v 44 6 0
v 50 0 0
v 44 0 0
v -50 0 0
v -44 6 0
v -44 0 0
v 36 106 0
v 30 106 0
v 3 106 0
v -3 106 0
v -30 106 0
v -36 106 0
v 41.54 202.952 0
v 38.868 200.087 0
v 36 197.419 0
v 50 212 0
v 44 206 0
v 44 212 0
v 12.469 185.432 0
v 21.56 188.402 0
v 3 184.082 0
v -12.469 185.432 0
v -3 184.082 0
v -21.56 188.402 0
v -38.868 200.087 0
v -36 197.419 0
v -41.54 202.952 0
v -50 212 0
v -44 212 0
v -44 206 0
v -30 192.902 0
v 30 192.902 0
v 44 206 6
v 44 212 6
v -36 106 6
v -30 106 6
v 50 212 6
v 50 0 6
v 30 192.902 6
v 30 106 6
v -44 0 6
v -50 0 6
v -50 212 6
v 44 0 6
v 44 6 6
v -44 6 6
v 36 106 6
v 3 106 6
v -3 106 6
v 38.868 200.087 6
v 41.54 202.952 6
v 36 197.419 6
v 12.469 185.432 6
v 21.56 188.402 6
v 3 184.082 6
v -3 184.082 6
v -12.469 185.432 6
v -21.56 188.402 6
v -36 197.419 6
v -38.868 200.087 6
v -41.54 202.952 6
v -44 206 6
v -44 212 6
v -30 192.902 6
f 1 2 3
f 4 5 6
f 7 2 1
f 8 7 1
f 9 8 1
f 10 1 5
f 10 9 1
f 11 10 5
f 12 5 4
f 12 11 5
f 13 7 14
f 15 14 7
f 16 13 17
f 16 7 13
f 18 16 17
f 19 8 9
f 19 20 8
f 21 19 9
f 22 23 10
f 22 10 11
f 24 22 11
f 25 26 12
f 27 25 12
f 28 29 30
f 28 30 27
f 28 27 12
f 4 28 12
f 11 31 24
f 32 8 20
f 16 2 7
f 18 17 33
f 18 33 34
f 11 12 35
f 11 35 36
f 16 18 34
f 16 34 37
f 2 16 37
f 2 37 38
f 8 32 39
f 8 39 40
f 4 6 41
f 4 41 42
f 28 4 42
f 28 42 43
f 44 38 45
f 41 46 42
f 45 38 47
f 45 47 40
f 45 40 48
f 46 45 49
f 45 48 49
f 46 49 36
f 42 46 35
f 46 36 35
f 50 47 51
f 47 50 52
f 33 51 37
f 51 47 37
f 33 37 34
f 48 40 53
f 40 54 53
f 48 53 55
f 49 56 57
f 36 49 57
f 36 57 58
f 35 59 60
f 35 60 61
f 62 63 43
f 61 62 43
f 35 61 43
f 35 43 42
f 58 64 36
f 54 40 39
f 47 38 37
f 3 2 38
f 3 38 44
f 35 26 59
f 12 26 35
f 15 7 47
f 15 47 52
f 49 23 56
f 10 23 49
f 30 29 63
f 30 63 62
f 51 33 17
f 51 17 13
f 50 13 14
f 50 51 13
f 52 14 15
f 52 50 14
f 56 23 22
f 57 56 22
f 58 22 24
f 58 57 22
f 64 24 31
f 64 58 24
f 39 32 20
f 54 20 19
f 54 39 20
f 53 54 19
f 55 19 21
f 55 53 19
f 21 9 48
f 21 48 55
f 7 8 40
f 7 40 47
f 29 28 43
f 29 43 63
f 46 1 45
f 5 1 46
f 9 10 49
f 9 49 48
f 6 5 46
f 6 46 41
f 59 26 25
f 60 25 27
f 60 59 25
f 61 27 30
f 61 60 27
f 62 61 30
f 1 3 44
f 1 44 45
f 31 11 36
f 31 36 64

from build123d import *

# Parameters (mm, degrees)
BOSS_EXTRU_1_DEPTH      = 6
ENL_V_MAT_EXTRU_1_DEPTH = 10


with BuildPart() as part:
    # Esquisse1 → Boss.-Extru.1 (new body)
    with BuildSketch(Plane.XY):
        Polygon((-50, 0), (-50, 212), (-44, 212), (-44, 206), (-36, 206), (-36, 106), (-30, 106), (-30, 206), (-3, 206), (-3, 106), (3, 106), (3, 206), (30, 206), (30, 106), (36, 106), (36, 206), (44, 206), (44, 212), (50, 212), (50, 0), (44, 0), (44, 6), (-44, 6), (-44, 0), align=None)
    extrude(amount=BOSS_EXTRU_1_DEPTH)

    # Esquisse2 → Enlèv. mat.-Extru.1 (cut)
    with BuildSketch(Plane.XY.offset(6)):
        with BuildLine():
            Line((-44, 206), (44, 206))
            ThreePointArc((44, 206), (0, 184), (-44, 206))
        make_face()
    extrude(amount=-ENL_V_MAT_EXTRU_1_DEPTH, mode=Mode.SUBTRACT)


solid = part.part
